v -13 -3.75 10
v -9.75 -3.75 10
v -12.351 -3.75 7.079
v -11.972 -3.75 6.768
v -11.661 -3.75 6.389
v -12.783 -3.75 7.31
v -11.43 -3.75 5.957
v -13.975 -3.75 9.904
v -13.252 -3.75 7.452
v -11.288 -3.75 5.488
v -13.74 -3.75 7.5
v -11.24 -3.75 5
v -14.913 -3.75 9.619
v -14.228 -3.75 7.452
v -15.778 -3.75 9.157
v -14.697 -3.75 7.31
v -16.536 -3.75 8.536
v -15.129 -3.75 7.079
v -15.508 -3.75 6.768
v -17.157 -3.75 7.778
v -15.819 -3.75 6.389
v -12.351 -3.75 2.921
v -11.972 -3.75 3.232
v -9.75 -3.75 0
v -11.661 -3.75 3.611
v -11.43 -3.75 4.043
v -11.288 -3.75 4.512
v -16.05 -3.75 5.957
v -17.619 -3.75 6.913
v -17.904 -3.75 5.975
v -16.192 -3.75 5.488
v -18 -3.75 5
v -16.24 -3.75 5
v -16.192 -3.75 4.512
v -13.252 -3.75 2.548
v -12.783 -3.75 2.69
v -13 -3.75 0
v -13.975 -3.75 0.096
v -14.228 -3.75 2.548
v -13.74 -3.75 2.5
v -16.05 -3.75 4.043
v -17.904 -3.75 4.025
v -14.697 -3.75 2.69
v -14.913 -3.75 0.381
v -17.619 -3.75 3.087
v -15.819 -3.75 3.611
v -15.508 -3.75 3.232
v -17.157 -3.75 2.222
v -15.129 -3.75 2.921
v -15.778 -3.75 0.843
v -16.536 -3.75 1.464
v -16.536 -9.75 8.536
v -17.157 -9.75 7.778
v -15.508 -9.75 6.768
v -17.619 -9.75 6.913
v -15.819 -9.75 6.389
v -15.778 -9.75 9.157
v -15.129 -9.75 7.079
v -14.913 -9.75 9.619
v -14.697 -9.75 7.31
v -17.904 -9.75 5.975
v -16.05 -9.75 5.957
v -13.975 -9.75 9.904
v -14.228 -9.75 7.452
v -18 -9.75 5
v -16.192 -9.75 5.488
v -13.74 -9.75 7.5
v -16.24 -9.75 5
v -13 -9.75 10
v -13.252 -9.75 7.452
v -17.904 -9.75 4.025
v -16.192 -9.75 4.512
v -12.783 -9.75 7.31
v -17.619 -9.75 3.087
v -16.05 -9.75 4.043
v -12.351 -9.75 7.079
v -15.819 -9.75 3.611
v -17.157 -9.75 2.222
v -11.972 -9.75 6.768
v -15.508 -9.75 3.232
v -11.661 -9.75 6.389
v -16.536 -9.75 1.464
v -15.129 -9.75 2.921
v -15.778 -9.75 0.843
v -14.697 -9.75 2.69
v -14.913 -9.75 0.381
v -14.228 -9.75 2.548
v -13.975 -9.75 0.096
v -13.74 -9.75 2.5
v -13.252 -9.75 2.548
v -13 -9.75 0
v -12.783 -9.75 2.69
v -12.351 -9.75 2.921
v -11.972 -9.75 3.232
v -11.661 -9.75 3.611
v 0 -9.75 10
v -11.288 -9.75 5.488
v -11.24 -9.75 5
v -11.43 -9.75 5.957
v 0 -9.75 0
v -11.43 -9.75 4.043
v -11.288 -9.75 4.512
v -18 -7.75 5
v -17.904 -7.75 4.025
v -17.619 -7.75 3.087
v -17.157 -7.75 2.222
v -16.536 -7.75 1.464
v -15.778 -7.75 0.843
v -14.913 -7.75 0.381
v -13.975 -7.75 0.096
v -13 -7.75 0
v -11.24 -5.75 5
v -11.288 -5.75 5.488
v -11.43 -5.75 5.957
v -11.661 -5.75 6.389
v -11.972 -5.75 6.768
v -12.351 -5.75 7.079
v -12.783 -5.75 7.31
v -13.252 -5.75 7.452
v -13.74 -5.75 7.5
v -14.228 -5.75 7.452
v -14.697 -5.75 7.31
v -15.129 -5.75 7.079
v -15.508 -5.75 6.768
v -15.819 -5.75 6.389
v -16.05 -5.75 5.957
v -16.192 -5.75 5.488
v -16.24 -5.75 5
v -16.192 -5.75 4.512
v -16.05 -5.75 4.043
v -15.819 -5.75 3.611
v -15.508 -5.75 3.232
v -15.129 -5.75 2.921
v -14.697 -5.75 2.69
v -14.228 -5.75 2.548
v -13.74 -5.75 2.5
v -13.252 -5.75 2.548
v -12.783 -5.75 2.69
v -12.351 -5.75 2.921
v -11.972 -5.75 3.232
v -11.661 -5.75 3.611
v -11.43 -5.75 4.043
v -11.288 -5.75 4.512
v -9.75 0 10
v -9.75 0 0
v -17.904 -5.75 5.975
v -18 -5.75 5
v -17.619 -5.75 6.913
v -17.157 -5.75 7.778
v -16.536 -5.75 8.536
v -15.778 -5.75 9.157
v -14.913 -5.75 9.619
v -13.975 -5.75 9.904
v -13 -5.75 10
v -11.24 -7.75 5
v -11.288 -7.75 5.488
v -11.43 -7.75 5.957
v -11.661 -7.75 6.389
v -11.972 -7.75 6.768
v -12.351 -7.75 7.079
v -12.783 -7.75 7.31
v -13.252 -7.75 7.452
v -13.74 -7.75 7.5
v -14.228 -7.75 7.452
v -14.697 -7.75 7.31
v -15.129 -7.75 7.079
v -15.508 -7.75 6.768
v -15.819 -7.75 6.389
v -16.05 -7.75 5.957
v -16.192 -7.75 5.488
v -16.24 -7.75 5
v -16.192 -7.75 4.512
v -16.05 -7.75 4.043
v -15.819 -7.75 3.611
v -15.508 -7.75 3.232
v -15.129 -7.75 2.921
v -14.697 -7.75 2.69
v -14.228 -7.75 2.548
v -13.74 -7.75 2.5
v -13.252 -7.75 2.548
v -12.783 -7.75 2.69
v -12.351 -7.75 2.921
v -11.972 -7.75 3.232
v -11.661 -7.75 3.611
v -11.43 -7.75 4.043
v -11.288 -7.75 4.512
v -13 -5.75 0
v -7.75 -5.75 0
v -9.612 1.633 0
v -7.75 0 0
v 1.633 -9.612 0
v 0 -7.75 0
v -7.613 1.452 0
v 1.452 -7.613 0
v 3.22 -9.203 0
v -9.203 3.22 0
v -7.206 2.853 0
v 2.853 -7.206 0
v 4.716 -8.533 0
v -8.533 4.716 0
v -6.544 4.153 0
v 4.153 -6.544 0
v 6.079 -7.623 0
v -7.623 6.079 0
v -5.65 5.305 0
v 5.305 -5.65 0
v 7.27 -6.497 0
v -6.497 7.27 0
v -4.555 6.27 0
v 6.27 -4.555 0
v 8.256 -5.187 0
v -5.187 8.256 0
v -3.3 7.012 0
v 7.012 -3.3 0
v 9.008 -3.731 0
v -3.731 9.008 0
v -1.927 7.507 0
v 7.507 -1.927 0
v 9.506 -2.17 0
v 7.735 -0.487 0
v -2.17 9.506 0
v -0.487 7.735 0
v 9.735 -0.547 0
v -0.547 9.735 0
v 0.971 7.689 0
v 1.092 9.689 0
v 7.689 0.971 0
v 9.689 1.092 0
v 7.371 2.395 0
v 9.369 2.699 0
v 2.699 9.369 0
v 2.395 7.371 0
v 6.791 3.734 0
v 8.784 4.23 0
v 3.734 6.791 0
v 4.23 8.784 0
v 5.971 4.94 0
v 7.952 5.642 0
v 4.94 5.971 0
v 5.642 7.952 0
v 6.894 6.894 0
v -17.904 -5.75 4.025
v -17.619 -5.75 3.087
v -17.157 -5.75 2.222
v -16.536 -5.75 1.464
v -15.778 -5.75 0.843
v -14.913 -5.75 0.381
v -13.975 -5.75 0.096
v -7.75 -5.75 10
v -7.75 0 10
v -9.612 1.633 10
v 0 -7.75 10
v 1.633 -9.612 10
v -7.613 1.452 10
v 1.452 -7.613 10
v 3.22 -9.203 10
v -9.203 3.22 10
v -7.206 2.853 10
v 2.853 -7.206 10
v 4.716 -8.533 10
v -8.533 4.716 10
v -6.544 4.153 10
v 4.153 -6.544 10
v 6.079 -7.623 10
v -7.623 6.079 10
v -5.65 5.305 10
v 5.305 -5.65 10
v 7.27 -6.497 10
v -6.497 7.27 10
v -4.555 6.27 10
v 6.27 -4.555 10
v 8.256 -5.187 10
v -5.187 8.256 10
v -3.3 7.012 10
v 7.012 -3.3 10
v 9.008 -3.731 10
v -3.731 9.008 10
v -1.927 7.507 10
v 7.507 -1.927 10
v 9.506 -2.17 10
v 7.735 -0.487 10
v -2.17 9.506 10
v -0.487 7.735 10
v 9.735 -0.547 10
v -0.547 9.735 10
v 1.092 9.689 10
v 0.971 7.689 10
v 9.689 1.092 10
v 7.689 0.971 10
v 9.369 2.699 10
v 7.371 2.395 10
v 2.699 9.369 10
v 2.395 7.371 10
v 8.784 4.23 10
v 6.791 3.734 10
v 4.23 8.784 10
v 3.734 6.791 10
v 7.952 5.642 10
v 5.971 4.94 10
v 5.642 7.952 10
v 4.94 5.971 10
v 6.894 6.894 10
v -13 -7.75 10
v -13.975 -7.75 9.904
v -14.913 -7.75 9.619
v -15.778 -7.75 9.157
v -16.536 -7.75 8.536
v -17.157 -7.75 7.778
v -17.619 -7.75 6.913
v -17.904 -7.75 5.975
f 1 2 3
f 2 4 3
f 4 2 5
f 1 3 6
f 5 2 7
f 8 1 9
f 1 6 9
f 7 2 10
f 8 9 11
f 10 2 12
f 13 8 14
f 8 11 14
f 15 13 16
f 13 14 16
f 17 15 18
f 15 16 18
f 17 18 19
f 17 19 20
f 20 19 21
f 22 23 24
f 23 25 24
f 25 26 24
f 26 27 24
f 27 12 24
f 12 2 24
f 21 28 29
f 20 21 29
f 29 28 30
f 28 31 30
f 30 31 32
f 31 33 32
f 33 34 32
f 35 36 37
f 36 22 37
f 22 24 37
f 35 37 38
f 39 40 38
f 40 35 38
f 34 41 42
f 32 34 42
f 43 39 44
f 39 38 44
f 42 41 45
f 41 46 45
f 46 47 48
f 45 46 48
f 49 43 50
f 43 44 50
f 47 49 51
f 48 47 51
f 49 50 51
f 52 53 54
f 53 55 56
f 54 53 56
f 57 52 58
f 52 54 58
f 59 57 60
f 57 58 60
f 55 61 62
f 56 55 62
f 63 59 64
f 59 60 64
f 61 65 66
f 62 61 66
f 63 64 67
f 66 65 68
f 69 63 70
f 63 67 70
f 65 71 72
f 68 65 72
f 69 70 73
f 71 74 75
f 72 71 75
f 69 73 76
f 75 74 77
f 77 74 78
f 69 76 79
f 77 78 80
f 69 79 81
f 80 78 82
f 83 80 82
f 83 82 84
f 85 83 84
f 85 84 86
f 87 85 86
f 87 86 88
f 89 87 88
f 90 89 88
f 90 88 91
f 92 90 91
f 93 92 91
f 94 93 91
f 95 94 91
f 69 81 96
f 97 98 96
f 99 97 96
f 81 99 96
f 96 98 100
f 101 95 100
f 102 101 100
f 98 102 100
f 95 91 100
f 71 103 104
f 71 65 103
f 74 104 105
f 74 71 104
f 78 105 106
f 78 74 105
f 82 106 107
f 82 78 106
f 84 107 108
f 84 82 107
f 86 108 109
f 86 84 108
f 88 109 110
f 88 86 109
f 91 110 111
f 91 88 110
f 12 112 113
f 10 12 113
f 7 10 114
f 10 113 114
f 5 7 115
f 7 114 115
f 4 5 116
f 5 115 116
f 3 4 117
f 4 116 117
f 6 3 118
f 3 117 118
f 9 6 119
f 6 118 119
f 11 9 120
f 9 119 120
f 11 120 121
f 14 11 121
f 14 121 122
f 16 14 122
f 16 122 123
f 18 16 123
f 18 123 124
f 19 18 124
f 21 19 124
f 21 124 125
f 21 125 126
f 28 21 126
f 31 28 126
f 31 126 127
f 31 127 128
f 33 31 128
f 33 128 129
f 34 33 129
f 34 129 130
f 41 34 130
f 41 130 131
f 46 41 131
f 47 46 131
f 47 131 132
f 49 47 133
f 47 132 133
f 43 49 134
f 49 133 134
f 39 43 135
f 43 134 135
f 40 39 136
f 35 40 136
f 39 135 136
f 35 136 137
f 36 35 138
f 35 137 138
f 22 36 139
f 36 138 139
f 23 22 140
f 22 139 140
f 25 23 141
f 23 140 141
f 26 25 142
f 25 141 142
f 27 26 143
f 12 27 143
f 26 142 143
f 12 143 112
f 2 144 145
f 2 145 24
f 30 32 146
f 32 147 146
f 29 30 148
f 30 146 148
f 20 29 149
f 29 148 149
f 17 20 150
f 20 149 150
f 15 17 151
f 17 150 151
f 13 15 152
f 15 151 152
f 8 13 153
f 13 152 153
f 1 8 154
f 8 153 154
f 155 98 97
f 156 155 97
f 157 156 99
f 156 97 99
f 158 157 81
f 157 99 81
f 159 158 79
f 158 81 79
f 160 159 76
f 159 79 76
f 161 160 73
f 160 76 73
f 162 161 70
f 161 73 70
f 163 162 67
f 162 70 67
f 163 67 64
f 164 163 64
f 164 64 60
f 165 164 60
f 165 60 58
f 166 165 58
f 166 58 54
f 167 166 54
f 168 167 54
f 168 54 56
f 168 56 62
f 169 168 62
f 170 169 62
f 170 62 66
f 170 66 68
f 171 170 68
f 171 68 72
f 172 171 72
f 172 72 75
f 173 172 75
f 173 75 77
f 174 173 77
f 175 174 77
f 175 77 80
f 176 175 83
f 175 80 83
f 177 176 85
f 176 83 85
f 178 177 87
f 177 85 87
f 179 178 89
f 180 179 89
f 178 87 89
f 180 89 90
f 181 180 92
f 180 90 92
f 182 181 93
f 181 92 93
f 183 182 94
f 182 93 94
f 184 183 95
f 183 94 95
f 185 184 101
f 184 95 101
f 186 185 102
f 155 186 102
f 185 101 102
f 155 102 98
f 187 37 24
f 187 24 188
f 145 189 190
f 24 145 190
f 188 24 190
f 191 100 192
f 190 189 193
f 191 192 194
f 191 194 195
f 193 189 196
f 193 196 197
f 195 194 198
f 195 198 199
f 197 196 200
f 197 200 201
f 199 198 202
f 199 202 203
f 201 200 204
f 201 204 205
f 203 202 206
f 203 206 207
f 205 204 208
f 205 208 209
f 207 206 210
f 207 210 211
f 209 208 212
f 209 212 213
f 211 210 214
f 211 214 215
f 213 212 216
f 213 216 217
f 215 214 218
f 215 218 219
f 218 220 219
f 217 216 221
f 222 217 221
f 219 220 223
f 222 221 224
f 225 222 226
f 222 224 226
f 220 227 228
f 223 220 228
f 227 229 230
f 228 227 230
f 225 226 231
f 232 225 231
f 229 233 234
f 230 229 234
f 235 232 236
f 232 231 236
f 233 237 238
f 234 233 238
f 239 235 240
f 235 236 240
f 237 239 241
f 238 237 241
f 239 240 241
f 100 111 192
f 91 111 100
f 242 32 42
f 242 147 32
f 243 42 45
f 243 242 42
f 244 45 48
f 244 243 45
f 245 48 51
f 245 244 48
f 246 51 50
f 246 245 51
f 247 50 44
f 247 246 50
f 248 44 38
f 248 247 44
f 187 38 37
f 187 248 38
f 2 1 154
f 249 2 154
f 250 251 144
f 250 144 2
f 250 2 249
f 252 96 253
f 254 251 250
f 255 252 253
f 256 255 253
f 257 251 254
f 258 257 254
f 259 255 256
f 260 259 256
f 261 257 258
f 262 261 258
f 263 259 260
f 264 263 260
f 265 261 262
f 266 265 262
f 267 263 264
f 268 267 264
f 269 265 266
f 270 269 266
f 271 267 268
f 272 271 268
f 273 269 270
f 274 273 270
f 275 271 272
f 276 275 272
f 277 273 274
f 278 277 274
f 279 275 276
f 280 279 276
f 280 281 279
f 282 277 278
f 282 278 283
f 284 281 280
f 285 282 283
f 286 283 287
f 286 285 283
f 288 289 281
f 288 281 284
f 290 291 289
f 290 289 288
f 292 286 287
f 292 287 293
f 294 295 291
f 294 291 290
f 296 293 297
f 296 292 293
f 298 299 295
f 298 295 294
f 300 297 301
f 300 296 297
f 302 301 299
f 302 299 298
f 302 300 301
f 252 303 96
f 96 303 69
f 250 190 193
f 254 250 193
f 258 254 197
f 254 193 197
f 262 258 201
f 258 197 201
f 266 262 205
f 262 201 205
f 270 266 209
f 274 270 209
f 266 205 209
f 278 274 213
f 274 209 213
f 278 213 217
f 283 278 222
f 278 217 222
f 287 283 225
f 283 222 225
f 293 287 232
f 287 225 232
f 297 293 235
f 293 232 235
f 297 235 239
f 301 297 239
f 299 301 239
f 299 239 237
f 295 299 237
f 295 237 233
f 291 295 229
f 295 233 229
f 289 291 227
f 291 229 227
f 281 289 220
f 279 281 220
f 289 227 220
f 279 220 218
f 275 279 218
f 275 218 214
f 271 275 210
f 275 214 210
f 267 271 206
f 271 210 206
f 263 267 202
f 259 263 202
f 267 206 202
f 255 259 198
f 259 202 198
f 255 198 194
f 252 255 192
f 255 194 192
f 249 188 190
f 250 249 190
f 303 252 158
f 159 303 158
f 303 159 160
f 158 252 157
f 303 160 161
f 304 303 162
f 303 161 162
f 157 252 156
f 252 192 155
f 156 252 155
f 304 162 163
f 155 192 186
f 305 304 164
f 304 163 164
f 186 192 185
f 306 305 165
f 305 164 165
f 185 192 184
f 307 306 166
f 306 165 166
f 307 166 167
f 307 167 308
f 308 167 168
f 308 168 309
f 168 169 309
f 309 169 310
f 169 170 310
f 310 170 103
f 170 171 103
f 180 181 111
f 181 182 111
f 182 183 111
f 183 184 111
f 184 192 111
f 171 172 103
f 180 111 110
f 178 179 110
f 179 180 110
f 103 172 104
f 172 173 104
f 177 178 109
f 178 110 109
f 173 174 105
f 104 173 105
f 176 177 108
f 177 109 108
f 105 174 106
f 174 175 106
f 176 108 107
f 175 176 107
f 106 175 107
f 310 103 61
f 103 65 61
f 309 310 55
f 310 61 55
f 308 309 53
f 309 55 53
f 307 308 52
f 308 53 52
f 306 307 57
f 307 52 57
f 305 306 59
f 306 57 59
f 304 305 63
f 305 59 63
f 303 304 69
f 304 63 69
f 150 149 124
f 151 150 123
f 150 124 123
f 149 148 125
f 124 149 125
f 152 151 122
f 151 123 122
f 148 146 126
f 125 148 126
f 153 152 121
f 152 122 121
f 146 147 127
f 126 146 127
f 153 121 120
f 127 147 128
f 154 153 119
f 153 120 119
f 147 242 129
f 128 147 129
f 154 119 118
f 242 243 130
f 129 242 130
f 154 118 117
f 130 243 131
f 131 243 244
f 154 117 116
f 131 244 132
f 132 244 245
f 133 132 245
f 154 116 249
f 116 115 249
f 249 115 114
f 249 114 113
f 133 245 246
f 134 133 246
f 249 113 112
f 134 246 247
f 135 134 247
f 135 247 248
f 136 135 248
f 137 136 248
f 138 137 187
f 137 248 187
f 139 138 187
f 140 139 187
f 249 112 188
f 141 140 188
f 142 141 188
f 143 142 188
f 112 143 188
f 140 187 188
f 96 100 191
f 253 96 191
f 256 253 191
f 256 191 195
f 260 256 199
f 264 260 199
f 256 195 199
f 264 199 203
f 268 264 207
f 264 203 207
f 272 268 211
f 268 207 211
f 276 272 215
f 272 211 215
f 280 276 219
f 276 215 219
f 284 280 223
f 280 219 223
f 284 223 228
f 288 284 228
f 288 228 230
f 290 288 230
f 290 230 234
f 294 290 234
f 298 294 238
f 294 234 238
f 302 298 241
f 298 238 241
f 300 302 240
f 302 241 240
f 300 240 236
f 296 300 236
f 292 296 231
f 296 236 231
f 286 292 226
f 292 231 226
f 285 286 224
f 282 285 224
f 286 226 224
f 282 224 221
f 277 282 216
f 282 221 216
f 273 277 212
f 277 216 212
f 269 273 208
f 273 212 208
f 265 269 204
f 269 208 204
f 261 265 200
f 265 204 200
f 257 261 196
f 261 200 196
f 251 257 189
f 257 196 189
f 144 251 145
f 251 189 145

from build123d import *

# Parameters (mm, degrees)
F1_DEPTH = 10
F2_R     = 4.99999
F4_D     = 5


# Not quite as in the source:
# - a fillet or chamfer is up to 0.001 mm smaller than in the source, because OpenCascade refuses the exact size


with BuildPart() as f1:
    # F0 (on Top) → F1 (new body)
    with BuildSketch(Plane.XY):
        with BuildLine():
            ThreePointArc((-7.75, 0), (5.4800775542, 5.4800775542), (0, -7.75))
            Line((0, -7.75), (-18, -7.75))
            Line((-18, -7.75), (-18, -9.75))
            Line((-18, -9.75), (0, -9.75))
            ThreePointArc((0, -9.75), (6.8942911166, 6.8942911166), (-9.75, 0))
            Line((-9.75, 0), (-9.75, -3.75))
            Line((-9.75, -3.75), (-18, -3.75))
            Line((-18, -3.75), (-18, -5.75))
            Line((-18, -5.75), (-7.75, -5.75))
            Line((-7.75, -5.75), (-7.75, 0))
        make_face()
    extrude(amount=F1_DEPTH)

    # F2 (radius 5 in the source; OpenCascade refuses exactly that, so slightly less here)
    f2_edges = [f1.edges().sort_by_distance(p)[0] for p in [
        (-18, -4.75, 0),
        (-18, -8.75, 0),
        (-18, -8.75, 10),
        (-18, -4.75, 10),
    ]]
    fillet(f2_edges, radius=F2_R)

    # F4 (through all)
    with Locations(Plane(origin=(0, -3.75, 0), x_dir=(-1, 0, 0), z_dir=(0, 1, 0))):
        with Locations((13.740055263, 5)):
            Hole(F4_D / 2)


solid = f1.part
